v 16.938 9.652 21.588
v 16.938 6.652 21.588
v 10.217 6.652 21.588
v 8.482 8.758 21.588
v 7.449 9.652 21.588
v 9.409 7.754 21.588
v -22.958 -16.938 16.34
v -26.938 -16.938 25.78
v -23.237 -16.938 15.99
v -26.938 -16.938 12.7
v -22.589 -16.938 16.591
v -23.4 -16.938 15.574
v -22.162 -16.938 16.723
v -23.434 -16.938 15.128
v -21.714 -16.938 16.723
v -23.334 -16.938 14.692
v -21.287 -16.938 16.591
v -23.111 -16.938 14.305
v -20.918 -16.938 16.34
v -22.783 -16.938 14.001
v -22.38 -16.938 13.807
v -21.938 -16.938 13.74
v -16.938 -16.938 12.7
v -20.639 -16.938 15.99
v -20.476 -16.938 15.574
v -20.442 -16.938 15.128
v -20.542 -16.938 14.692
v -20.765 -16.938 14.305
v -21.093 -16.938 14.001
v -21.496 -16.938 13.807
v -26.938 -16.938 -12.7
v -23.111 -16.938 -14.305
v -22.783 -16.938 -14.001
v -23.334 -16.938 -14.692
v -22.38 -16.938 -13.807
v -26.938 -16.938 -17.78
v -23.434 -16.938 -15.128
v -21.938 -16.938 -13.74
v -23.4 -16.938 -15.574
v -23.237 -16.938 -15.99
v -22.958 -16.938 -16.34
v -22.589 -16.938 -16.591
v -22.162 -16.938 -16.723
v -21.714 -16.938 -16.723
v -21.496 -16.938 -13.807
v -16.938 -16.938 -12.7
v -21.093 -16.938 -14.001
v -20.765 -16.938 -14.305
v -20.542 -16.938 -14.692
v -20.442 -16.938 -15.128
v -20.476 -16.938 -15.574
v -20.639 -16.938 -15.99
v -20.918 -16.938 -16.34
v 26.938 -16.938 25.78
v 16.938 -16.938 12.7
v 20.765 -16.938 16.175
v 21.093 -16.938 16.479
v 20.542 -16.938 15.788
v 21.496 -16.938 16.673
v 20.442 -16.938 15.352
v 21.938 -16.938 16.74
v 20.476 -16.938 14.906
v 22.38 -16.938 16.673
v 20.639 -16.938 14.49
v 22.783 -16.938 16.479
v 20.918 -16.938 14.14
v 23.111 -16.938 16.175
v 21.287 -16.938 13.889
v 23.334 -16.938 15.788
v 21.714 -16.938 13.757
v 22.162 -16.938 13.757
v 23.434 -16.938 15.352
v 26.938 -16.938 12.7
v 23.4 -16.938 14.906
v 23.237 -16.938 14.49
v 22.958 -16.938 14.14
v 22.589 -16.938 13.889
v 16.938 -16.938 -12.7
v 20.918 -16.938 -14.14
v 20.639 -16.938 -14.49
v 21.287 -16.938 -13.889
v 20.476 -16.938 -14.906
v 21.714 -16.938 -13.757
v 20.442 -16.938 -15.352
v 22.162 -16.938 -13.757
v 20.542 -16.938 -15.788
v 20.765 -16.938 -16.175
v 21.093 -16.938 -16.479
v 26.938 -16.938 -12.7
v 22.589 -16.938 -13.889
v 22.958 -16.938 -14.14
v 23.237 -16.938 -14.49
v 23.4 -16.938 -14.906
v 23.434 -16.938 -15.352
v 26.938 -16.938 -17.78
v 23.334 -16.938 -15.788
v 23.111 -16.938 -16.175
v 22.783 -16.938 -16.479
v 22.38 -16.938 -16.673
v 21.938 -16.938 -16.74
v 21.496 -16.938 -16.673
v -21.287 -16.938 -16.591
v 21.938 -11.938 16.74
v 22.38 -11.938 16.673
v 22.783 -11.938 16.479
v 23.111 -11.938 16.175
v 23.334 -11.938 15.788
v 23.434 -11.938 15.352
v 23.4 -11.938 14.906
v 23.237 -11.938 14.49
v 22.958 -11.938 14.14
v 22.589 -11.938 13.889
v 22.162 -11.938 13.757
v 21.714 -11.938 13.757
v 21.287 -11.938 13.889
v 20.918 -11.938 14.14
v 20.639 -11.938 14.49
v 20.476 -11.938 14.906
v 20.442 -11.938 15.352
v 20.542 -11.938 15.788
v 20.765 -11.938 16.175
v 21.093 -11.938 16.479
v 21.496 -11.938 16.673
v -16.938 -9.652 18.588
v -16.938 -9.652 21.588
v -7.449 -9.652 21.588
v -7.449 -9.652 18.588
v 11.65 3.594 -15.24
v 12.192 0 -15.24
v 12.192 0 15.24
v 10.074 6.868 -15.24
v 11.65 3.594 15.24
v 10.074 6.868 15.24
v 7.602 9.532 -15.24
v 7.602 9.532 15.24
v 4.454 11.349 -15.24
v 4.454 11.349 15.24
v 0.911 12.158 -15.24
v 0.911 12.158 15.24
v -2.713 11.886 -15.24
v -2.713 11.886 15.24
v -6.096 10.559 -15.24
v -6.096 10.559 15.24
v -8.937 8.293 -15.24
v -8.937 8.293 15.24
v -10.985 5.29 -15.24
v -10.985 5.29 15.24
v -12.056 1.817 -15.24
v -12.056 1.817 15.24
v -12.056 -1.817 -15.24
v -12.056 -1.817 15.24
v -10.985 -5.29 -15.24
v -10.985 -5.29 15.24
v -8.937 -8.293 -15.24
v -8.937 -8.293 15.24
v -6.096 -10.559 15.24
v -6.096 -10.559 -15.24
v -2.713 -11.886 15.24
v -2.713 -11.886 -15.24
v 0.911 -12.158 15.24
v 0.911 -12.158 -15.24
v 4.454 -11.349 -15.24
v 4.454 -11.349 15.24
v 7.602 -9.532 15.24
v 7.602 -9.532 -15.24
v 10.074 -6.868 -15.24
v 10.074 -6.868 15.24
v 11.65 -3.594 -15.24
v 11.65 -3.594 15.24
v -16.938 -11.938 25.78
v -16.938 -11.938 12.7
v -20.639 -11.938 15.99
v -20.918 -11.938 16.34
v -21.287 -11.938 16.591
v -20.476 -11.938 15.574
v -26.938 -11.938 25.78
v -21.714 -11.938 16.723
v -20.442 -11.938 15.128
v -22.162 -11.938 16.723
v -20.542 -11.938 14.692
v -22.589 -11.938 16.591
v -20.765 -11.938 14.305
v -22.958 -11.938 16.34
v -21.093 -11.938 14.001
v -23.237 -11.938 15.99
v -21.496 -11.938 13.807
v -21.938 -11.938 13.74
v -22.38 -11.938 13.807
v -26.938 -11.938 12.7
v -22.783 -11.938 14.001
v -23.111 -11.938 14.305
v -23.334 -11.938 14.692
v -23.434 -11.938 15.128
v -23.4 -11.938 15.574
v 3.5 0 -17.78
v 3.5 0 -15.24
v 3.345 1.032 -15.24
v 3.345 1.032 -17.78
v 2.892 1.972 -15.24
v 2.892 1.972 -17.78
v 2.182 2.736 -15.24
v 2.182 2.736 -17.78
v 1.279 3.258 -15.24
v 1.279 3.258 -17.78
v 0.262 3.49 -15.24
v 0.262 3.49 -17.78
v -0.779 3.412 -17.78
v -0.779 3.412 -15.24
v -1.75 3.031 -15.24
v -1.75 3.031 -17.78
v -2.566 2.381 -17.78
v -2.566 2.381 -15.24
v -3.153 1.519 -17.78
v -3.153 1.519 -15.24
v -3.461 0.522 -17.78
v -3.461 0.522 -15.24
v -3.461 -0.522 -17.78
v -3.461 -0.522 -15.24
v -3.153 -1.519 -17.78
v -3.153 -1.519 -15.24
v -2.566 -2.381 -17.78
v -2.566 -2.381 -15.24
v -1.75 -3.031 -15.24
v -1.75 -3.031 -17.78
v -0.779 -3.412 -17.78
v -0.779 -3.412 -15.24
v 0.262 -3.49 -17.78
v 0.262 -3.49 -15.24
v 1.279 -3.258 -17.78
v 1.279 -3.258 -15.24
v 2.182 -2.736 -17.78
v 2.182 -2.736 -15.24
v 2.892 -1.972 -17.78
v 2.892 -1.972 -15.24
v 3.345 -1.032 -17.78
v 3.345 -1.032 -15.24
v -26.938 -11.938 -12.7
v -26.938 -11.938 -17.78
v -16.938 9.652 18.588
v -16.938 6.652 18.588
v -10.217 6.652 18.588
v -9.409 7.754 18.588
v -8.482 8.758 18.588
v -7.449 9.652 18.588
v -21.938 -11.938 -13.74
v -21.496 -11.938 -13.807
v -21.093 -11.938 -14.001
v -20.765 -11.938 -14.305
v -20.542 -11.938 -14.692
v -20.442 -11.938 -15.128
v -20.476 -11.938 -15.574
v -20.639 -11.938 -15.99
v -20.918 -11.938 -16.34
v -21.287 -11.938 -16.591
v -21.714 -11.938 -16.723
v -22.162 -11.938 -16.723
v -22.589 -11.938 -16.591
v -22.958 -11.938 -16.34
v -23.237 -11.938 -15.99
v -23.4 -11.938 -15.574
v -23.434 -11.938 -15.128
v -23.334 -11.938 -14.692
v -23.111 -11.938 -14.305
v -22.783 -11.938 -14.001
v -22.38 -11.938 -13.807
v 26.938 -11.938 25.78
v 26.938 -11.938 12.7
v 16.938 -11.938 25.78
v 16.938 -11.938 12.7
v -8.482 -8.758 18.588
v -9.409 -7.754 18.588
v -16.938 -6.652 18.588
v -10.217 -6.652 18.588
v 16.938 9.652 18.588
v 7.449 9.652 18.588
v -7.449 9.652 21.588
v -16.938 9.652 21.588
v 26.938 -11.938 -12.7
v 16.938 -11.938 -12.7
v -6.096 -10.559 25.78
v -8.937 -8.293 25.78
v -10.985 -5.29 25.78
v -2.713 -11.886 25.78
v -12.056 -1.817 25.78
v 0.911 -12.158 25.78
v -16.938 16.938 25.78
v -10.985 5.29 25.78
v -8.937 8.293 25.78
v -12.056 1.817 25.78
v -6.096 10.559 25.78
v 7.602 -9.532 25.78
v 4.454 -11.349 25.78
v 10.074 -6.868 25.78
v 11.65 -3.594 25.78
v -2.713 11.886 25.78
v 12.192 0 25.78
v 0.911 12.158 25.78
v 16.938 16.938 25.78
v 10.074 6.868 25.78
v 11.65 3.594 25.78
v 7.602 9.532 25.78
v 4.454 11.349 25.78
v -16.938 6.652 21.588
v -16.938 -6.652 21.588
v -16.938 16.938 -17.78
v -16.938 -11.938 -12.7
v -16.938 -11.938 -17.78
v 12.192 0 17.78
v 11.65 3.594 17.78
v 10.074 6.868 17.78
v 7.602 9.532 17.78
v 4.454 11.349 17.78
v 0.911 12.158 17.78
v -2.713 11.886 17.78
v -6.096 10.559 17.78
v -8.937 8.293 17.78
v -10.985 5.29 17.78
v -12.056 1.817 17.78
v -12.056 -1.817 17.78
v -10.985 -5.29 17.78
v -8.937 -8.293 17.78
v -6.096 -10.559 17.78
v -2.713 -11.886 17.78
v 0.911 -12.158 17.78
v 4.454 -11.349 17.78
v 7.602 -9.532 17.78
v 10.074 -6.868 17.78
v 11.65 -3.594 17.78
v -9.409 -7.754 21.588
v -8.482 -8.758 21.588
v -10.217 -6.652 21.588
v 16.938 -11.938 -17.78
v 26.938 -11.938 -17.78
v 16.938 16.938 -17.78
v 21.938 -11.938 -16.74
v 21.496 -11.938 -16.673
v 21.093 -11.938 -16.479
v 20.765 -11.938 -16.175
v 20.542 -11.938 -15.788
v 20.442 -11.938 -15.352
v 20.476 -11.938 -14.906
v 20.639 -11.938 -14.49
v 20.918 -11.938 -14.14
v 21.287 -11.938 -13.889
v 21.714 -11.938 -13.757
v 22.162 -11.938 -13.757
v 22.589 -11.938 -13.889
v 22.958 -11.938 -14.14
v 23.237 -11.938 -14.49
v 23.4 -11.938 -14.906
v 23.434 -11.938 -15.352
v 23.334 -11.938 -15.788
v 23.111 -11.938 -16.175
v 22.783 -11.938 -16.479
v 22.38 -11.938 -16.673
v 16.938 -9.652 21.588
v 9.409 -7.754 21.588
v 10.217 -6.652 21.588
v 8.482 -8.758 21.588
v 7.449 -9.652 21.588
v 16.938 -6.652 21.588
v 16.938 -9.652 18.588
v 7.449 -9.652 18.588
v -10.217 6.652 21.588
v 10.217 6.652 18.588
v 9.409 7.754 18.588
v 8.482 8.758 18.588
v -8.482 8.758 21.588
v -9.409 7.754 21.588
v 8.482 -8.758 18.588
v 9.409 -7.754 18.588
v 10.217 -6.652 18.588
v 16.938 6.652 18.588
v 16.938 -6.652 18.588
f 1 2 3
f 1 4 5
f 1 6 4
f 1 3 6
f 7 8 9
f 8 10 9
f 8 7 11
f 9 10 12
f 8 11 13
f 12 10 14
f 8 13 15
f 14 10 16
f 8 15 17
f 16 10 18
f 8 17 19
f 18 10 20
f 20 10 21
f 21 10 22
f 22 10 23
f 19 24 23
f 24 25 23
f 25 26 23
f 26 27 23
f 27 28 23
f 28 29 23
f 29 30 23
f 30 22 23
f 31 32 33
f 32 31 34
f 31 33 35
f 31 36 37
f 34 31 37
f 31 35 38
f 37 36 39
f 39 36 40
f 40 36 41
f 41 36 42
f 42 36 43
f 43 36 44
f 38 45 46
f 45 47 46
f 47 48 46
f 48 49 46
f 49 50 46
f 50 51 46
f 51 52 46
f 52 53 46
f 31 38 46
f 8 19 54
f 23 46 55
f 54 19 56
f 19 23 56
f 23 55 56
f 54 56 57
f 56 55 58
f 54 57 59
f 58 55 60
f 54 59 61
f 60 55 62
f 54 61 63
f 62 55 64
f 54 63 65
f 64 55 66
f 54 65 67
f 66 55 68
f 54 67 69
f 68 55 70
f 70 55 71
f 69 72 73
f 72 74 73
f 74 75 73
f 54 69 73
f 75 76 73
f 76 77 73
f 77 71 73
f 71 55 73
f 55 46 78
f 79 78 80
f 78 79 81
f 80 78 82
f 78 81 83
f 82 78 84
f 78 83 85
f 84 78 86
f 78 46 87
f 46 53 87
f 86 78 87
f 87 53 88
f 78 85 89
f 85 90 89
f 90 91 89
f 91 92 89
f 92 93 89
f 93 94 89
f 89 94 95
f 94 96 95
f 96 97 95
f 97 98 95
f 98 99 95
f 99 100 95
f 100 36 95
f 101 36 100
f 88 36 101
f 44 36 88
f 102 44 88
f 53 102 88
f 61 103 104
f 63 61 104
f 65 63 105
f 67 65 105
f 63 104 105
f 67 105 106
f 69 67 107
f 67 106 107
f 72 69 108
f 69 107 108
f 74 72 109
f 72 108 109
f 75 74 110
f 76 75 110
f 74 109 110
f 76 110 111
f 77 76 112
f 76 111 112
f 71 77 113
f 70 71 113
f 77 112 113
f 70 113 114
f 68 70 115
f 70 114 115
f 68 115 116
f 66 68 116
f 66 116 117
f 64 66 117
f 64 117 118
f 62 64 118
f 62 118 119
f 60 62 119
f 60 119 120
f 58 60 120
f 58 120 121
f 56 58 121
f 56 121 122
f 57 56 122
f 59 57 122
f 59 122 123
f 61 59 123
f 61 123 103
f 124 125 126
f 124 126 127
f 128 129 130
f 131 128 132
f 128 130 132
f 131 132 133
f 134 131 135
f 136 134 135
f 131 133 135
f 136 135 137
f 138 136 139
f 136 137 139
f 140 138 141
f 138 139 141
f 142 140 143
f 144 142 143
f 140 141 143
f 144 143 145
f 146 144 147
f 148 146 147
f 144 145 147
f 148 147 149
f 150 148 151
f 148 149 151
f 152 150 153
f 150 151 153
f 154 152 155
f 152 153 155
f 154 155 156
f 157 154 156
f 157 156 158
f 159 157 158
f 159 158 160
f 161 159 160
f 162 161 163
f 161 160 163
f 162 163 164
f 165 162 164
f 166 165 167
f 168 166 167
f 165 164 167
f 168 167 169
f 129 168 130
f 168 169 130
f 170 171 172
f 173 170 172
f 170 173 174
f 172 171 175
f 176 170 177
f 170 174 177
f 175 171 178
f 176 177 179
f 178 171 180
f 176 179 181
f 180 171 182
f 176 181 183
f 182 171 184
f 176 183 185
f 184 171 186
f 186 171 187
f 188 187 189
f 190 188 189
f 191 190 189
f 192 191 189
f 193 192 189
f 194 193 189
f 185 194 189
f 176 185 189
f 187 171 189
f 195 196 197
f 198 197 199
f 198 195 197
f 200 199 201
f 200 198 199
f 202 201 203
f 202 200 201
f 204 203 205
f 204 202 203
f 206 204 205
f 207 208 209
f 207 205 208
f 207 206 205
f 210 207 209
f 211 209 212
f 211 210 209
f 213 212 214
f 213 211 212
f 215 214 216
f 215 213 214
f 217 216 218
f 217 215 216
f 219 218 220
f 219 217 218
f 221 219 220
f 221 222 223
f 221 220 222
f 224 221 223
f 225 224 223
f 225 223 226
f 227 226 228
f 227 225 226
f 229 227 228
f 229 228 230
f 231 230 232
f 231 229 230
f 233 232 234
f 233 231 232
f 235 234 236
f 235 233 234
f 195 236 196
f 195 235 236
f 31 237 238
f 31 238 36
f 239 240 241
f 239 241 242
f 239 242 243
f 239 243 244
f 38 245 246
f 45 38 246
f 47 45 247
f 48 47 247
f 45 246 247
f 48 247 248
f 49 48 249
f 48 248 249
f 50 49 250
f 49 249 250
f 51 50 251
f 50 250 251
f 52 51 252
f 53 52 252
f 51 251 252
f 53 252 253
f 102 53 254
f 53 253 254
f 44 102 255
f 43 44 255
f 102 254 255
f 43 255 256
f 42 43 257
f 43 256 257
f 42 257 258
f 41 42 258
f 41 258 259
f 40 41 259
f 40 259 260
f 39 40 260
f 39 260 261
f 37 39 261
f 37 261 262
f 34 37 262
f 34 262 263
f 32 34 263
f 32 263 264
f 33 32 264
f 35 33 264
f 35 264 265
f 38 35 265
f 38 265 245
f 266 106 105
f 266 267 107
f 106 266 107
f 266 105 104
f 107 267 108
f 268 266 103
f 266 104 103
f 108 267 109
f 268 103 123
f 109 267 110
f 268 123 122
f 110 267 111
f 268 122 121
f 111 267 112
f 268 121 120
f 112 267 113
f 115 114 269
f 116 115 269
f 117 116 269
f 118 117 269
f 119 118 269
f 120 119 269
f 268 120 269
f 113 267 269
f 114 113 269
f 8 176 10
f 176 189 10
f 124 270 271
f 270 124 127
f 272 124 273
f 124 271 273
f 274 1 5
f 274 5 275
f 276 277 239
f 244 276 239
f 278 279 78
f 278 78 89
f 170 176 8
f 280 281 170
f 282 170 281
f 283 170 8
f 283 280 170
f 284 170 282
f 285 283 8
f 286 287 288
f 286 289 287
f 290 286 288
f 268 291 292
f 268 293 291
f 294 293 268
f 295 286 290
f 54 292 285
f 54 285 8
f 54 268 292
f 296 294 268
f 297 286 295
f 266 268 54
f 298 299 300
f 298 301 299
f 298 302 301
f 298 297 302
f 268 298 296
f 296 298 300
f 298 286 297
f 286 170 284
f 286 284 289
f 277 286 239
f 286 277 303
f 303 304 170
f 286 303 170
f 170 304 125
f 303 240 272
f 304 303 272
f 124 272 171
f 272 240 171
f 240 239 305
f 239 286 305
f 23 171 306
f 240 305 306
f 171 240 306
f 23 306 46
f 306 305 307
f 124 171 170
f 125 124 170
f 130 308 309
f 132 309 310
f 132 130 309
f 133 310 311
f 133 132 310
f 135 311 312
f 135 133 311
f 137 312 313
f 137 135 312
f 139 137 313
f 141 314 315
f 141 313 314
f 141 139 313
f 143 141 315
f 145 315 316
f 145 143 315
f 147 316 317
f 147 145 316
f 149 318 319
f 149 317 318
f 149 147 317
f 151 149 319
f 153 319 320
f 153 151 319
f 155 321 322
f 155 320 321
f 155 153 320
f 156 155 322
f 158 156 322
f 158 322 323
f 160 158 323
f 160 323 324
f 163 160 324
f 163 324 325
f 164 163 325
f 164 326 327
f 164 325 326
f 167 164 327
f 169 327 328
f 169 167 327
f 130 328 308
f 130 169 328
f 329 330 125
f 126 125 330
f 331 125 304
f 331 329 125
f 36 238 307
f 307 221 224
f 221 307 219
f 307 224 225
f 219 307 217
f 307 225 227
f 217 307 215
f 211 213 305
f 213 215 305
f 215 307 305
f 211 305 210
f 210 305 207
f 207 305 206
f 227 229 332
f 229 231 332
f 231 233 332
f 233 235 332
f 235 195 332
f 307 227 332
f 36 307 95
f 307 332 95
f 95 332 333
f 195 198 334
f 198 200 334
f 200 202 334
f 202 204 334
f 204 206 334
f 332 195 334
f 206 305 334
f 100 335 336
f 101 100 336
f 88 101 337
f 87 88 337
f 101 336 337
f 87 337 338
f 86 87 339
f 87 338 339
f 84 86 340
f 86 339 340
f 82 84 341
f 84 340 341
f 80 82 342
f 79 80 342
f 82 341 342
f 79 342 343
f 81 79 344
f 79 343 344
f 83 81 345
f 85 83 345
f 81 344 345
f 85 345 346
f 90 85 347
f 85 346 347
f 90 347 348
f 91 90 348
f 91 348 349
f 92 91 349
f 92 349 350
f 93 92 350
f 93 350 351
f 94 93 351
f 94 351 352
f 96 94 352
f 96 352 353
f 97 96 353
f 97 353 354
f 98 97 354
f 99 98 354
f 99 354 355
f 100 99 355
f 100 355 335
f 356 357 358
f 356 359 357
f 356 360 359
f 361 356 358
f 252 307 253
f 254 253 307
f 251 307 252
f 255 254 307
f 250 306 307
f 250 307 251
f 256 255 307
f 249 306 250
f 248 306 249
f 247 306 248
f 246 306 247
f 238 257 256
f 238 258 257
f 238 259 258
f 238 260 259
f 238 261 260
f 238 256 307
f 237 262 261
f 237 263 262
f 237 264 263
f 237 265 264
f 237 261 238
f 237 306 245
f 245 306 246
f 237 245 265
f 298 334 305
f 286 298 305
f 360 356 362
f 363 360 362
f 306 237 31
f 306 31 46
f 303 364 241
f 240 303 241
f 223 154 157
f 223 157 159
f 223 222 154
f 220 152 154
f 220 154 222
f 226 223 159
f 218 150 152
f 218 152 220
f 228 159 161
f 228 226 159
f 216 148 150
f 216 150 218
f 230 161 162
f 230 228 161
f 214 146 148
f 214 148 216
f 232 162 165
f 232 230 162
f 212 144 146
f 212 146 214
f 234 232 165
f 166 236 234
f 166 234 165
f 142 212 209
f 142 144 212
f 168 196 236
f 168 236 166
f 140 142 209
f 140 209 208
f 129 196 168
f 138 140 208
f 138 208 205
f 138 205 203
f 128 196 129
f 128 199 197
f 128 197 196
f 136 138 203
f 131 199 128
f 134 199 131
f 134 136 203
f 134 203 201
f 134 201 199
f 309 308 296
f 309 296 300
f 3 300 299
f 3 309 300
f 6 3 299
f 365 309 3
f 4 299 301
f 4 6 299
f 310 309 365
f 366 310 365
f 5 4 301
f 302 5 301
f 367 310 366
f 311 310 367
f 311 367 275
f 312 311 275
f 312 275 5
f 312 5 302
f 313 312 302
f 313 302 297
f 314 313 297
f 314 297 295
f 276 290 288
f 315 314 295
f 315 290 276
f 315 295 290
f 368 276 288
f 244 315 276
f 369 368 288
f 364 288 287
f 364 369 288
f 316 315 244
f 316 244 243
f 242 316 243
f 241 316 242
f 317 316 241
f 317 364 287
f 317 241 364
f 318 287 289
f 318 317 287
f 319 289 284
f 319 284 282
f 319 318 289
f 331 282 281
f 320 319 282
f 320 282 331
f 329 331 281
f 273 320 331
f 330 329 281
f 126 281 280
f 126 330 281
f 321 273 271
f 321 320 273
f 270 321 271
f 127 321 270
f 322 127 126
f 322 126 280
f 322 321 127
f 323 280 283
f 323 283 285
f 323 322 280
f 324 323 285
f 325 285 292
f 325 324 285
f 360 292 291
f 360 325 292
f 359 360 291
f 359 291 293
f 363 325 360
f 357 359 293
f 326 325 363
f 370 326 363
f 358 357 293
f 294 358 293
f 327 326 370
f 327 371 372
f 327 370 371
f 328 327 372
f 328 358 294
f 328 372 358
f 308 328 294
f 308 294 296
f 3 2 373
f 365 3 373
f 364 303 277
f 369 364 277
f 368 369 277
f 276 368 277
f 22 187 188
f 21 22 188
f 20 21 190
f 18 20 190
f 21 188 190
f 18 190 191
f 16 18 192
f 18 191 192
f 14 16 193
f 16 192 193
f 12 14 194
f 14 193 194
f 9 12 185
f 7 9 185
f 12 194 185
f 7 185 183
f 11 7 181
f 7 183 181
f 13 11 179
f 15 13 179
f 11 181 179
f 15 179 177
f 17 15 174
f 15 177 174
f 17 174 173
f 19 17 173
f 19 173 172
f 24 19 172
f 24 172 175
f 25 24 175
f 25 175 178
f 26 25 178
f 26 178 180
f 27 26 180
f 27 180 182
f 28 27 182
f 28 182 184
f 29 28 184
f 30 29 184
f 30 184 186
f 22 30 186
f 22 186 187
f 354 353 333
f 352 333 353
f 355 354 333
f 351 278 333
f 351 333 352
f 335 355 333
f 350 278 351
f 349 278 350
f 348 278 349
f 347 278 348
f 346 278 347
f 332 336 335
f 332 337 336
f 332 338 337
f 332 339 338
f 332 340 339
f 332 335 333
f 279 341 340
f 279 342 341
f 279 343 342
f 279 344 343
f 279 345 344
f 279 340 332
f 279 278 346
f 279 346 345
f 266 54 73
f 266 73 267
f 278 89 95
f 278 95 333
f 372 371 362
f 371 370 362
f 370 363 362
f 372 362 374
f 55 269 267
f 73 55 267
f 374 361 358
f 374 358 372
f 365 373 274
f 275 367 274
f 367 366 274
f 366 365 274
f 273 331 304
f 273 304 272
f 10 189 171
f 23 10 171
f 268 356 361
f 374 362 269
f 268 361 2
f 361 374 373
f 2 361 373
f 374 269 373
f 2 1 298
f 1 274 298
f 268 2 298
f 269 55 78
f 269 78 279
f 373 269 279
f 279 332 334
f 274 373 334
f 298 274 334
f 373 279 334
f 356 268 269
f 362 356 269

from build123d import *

# Parameters (mm, degrees)
SKETCH1_R           = 3.5
BOSS_EXTRUDE1_DEPTH = 17.78
SKETCH2_R           = 12.192
CUT_EXTRUDE1_DEPTH  = 15.24
CUT_EXTRUDE3_REACH  = 49.719
SKETCH4_W           = 2
SKETCH4_H           = 2
CUT_EXTRUDE4_REACH  = 45.308
SKETCH5_R           = 1.5
SKETCH5_W           = 10
SKETCH5_H           = 25.4
CUT_EXTRUDE5_REACH  = 38.451
SKETCH2_2_R         = 12.192
SKETCH6_R           = 12.192
BOSS_EXTRUDE2_DEPTH = 8
CUT_EXTRUDE6_REACH  = 55.634
SKETCH7_W           = 3
SKETCH7_H           = 3


with BuildPart() as part:
    # Sketch1 → Boss-Extrude1 (new, symmetric)
    with BuildSketch(Plane.XY):
        Polygon((26.938, -11.938), (16.938, -11.938), (16.938, 16.938), (-16.938, 16.938), (-16.938, -11.938), (-26.938, -11.938), (-26.938, -16.938), (26.938, -16.938), align=None)
        Circle(SKETCH1_R, mode=Mode.SUBTRACT)
    extrude(amount=BOSS_EXTRUDE1_DEPTH, both=True)

    # Sketch2 → Cut-Extrude1 (cut, symmetric)
    with BuildSketch(Plane.XY):
        Circle(SKETCH2_R)
    extrude(amount=CUT_EXTRUDE1_DEPTH, both=True, mode=Mode.SUBTRACT)

    # Sketch4 → Cut-Extrude3 (cut, up to next)
    with BuildSketch(Plane.XY.offset(17.78), mode=Mode.PRIVATE) as cut_extrude3_sk1:
        with Locations((-10.219, -1)):
            Rectangle(SKETCH4_W, SKETCH4_H)
    cut_extrude3_tool1 = extrude(cut_extrude3_sk1.sketch, amount=-CUT_EXTRUDE3_REACH, mode=Mode.PRIVATE) & part.part
    # Sketch4 → Cut-Extrude3 (cut, up to next)
    with BuildSketch(Plane.XY.offset(17.78), mode=Mode.PRIVATE) as cut_extrude3_sk2:
        with Locations((10.219, -1)):
            Rectangle(SKETCH4_W, SKETCH4_H)
    cut_extrude3_tool2 = extrude(cut_extrude3_sk2.sketch, amount=-CUT_EXTRUDE3_REACH, mode=Mode.PRIVATE) & part.part
    add(cut_extrude3_tool1.solids().sort_by_distance((-10.219, -1, 17.78))[0], mode=Mode.SUBTRACT)
    add(cut_extrude3_tool2.solids().sort_by_distance((10.219, -1, 17.78))[0], mode=Mode.SUBTRACT)

    # Sketch5 → Cut-Extrude4 (cut, up to next)
    with BuildSketch(Plane(origin=(0, -11.938, 0), x_dir=(1, 0, 0), z_dir=(0, 1, 0)), mode=Mode.PRIVATE) as cut_extrude4_sk1:
        with Locations(Location((-21.938, 15.24, 0), (0, 0, 270))):
            Circle(SKETCH5_R)
    cut_extrude4_tool1 = extrude(cut_extrude4_sk1.sketch, amount=-CUT_EXTRUDE4_REACH, mode=Mode.PRIVATE) & part.part
    # Sketch5 → Cut-Extrude4 (cut, up to next)
    with BuildSketch(Plane(origin=(0, -11.938, 0), x_dir=(1, 0, 0), z_dir=(0, 1, 0)), mode=Mode.PRIVATE) as cut_extrude4_sk2:
        with Locations(Location((21.938, 15.24, 0), (0, 0, 90))):
            Circle(SKETCH5_R)
    cut_extrude4_tool2 = extrude(cut_extrude4_sk2.sketch, amount=-CUT_EXTRUDE4_REACH, mode=Mode.PRIVATE) & part.part
    # Sketch5 → Cut-Extrude4 (cut, up to next)
    with BuildSketch(Plane(origin=(0, -11.938, 0), x_dir=(1, 0, 0), z_dir=(0, 1, 0)), mode=Mode.PRIVATE) as cut_extrude4_sk3:
        with Locations(Location((21.938, -15.24, 0), (0, 0, 270))):
            Circle(SKETCH5_R)
    cut_extrude4_tool3 = extrude(cut_extrude4_sk3.sketch, amount=-CUT_EXTRUDE4_REACH, mode=Mode.PRIVATE) & part.part
    # Sketch5 → Cut-Extrude4 (cut, up to next)
    with BuildSketch(Plane(origin=(0, -11.938, 0), x_dir=(1, 0, 0), z_dir=(0, 1, 0)), mode=Mode.PRIVATE) as cut_extrude4_sk4:
        with Locations(Location((-21.938, -15.24, 0), (0, 0, 90))):
            Circle(SKETCH5_R)
    cut_extrude4_tool4 = extrude(cut_extrude4_sk4.sketch, amount=-CUT_EXTRUDE4_REACH, mode=Mode.PRIVATE) & part.part
    # Sketch5 → Cut-Extrude4 (cut, up to next)
    with BuildSketch(Plane(origin=(0, -11.938, 0), x_dir=(1, 0, 0), z_dir=(0, 1, 0)), mode=Mode.PRIVATE) as cut_extrude4_sk5:
        with Locations((-21.938, 0)):
            Rectangle(SKETCH5_W, SKETCH5_H)
    cut_extrude4_tool5 = extrude(cut_extrude4_sk5.sketch, amount=-CUT_EXTRUDE4_REACH, mode=Mode.PRIVATE) & part.part
    # Sketch5 → Cut-Extrude4 (cut, up to next)
    with BuildSketch(Plane(origin=(0, -11.938, 0), x_dir=(1, 0, 0), z_dir=(0, 1, 0)), mode=Mode.PRIVATE) as cut_extrude4_sk6:
        with Locations((21.938, 0)):
            Rectangle(SKETCH5_W, SKETCH5_H)
    cut_extrude4_tool6 = extrude(cut_extrude4_sk6.sketch, amount=-CUT_EXTRUDE4_REACH, mode=Mode.PRIVATE) & part.part
    add(cut_extrude4_tool1.solids().sort_by_distance((-21.938, -11.938, -15.24))[0], mode=Mode.SUBTRACT)
    add(cut_extrude4_tool2.solids().sort_by_distance((21.938, -11.938, -15.24))[0], mode=Mode.SUBTRACT)
    add(cut_extrude4_tool3.solids().sort_by_distance((21.938, -11.938, 15.24))[0], mode=Mode.SUBTRACT)
    add(cut_extrude4_tool4.solids().sort_by_distance((-21.938, -11.938, 15.24))[0], mode=Mode.SUBTRACT)
    add(cut_extrude4_tool5.solids().sort_by_distance((-21.938, -11.938, 0))[0], mode=Mode.SUBTRACT)
    add(cut_extrude4_tool6.solids().sort_by_distance((21.938, -11.938, 0))[0], mode=Mode.SUBTRACT)

    # Sketch2<2> → Cut-Extrude5 (cut, up to next)
    with BuildSketch(Plane.XY, mode=Mode.PRIVATE) as cut_extrude5_sk1:
        Circle(SKETCH2_2_R)
    cut_extrude5_tool1 = extrude(cut_extrude5_sk1.sketch, amount=CUT_EXTRUDE5_REACH, mode=Mode.PRIVATE) & part.part
    add(cut_extrude5_tool1.solids().sort_by_distance((0, 0, 0))[0], mode=Mode.SUBTRACT)

    # Sketch6 → Boss-Extrude2 (add)
    with BuildSketch(Plane.XY.offset(17.78)):
        Polygon((-16.938, -11.938), (-26.938, -11.938), (-26.938, -16.938), (26.938, -16.938), (26.938, -11.938), (16.938, -11.938), (16.938, 16.938), (-16.938, 16.938), align=None)
        Circle(SKETCH6_R, mode=Mode.SUBTRACT)
    extrude(amount=BOSS_EXTRUDE2_DEPTH)

    # Cut-Extrude6: up to this face of the body (flat: up to its plane)
    cut_extrude6_end = Plane(part.part.faces().sort_by_distance((-16.938, 0.946659371, 3.633170238))[0])
    # Sketch7 → Cut-Extrude6 (cut, up to the picked face)
    with BuildSketch(Plane(origin=(16.938, 0, 0), x_dir=(0, 0, -1), z_dir=(1, 0, 0)), mode=Mode.PRIVATE) as cut_extrude6_sk1:
        with Locations((-20.0876, 8.152)):
            Rectangle(SKETCH7_W, SKETCH7_H)
    cut_extrude6_tool1 = split(extrude(cut_extrude6_sk1.sketch, amount=-CUT_EXTRUDE6_REACH, mode=Mode.PRIVATE), bisect_by=cut_extrude6_end, keep=Keep.BOTH, mode=Mode.PRIVATE)
    # Sketch7 → Cut-Extrude6 (cut, up to the picked face)
    with BuildSketch(Plane(origin=(16.938, 0, 0), x_dir=(0, 0, -1), z_dir=(1, 0, 0)), mode=Mode.PRIVATE) as cut_extrude6_sk2:
        with Locations((-20.0876, -8.152)):
            Rectangle(SKETCH7_W, SKETCH7_H)
    cut_extrude6_tool2 = split(extrude(cut_extrude6_sk2.sketch, amount=-CUT_EXTRUDE6_REACH, mode=Mode.PRIVATE), bisect_by=cut_extrude6_end, keep=Keep.BOTH, mode=Mode.PRIVATE)
    add(cut_extrude6_tool1.solids().sort_by(Axis((16.938, 8.152, 20.0876), (-1, 0, 0)))[0], mode=Mode.SUBTRACT)
    add(cut_extrude6_tool2.solids().sort_by(Axis((16.938, -8.152, 20.0876), (-1, 0, 0)))[0], mode=Mode.SUBTRACT)


solid = part.part
